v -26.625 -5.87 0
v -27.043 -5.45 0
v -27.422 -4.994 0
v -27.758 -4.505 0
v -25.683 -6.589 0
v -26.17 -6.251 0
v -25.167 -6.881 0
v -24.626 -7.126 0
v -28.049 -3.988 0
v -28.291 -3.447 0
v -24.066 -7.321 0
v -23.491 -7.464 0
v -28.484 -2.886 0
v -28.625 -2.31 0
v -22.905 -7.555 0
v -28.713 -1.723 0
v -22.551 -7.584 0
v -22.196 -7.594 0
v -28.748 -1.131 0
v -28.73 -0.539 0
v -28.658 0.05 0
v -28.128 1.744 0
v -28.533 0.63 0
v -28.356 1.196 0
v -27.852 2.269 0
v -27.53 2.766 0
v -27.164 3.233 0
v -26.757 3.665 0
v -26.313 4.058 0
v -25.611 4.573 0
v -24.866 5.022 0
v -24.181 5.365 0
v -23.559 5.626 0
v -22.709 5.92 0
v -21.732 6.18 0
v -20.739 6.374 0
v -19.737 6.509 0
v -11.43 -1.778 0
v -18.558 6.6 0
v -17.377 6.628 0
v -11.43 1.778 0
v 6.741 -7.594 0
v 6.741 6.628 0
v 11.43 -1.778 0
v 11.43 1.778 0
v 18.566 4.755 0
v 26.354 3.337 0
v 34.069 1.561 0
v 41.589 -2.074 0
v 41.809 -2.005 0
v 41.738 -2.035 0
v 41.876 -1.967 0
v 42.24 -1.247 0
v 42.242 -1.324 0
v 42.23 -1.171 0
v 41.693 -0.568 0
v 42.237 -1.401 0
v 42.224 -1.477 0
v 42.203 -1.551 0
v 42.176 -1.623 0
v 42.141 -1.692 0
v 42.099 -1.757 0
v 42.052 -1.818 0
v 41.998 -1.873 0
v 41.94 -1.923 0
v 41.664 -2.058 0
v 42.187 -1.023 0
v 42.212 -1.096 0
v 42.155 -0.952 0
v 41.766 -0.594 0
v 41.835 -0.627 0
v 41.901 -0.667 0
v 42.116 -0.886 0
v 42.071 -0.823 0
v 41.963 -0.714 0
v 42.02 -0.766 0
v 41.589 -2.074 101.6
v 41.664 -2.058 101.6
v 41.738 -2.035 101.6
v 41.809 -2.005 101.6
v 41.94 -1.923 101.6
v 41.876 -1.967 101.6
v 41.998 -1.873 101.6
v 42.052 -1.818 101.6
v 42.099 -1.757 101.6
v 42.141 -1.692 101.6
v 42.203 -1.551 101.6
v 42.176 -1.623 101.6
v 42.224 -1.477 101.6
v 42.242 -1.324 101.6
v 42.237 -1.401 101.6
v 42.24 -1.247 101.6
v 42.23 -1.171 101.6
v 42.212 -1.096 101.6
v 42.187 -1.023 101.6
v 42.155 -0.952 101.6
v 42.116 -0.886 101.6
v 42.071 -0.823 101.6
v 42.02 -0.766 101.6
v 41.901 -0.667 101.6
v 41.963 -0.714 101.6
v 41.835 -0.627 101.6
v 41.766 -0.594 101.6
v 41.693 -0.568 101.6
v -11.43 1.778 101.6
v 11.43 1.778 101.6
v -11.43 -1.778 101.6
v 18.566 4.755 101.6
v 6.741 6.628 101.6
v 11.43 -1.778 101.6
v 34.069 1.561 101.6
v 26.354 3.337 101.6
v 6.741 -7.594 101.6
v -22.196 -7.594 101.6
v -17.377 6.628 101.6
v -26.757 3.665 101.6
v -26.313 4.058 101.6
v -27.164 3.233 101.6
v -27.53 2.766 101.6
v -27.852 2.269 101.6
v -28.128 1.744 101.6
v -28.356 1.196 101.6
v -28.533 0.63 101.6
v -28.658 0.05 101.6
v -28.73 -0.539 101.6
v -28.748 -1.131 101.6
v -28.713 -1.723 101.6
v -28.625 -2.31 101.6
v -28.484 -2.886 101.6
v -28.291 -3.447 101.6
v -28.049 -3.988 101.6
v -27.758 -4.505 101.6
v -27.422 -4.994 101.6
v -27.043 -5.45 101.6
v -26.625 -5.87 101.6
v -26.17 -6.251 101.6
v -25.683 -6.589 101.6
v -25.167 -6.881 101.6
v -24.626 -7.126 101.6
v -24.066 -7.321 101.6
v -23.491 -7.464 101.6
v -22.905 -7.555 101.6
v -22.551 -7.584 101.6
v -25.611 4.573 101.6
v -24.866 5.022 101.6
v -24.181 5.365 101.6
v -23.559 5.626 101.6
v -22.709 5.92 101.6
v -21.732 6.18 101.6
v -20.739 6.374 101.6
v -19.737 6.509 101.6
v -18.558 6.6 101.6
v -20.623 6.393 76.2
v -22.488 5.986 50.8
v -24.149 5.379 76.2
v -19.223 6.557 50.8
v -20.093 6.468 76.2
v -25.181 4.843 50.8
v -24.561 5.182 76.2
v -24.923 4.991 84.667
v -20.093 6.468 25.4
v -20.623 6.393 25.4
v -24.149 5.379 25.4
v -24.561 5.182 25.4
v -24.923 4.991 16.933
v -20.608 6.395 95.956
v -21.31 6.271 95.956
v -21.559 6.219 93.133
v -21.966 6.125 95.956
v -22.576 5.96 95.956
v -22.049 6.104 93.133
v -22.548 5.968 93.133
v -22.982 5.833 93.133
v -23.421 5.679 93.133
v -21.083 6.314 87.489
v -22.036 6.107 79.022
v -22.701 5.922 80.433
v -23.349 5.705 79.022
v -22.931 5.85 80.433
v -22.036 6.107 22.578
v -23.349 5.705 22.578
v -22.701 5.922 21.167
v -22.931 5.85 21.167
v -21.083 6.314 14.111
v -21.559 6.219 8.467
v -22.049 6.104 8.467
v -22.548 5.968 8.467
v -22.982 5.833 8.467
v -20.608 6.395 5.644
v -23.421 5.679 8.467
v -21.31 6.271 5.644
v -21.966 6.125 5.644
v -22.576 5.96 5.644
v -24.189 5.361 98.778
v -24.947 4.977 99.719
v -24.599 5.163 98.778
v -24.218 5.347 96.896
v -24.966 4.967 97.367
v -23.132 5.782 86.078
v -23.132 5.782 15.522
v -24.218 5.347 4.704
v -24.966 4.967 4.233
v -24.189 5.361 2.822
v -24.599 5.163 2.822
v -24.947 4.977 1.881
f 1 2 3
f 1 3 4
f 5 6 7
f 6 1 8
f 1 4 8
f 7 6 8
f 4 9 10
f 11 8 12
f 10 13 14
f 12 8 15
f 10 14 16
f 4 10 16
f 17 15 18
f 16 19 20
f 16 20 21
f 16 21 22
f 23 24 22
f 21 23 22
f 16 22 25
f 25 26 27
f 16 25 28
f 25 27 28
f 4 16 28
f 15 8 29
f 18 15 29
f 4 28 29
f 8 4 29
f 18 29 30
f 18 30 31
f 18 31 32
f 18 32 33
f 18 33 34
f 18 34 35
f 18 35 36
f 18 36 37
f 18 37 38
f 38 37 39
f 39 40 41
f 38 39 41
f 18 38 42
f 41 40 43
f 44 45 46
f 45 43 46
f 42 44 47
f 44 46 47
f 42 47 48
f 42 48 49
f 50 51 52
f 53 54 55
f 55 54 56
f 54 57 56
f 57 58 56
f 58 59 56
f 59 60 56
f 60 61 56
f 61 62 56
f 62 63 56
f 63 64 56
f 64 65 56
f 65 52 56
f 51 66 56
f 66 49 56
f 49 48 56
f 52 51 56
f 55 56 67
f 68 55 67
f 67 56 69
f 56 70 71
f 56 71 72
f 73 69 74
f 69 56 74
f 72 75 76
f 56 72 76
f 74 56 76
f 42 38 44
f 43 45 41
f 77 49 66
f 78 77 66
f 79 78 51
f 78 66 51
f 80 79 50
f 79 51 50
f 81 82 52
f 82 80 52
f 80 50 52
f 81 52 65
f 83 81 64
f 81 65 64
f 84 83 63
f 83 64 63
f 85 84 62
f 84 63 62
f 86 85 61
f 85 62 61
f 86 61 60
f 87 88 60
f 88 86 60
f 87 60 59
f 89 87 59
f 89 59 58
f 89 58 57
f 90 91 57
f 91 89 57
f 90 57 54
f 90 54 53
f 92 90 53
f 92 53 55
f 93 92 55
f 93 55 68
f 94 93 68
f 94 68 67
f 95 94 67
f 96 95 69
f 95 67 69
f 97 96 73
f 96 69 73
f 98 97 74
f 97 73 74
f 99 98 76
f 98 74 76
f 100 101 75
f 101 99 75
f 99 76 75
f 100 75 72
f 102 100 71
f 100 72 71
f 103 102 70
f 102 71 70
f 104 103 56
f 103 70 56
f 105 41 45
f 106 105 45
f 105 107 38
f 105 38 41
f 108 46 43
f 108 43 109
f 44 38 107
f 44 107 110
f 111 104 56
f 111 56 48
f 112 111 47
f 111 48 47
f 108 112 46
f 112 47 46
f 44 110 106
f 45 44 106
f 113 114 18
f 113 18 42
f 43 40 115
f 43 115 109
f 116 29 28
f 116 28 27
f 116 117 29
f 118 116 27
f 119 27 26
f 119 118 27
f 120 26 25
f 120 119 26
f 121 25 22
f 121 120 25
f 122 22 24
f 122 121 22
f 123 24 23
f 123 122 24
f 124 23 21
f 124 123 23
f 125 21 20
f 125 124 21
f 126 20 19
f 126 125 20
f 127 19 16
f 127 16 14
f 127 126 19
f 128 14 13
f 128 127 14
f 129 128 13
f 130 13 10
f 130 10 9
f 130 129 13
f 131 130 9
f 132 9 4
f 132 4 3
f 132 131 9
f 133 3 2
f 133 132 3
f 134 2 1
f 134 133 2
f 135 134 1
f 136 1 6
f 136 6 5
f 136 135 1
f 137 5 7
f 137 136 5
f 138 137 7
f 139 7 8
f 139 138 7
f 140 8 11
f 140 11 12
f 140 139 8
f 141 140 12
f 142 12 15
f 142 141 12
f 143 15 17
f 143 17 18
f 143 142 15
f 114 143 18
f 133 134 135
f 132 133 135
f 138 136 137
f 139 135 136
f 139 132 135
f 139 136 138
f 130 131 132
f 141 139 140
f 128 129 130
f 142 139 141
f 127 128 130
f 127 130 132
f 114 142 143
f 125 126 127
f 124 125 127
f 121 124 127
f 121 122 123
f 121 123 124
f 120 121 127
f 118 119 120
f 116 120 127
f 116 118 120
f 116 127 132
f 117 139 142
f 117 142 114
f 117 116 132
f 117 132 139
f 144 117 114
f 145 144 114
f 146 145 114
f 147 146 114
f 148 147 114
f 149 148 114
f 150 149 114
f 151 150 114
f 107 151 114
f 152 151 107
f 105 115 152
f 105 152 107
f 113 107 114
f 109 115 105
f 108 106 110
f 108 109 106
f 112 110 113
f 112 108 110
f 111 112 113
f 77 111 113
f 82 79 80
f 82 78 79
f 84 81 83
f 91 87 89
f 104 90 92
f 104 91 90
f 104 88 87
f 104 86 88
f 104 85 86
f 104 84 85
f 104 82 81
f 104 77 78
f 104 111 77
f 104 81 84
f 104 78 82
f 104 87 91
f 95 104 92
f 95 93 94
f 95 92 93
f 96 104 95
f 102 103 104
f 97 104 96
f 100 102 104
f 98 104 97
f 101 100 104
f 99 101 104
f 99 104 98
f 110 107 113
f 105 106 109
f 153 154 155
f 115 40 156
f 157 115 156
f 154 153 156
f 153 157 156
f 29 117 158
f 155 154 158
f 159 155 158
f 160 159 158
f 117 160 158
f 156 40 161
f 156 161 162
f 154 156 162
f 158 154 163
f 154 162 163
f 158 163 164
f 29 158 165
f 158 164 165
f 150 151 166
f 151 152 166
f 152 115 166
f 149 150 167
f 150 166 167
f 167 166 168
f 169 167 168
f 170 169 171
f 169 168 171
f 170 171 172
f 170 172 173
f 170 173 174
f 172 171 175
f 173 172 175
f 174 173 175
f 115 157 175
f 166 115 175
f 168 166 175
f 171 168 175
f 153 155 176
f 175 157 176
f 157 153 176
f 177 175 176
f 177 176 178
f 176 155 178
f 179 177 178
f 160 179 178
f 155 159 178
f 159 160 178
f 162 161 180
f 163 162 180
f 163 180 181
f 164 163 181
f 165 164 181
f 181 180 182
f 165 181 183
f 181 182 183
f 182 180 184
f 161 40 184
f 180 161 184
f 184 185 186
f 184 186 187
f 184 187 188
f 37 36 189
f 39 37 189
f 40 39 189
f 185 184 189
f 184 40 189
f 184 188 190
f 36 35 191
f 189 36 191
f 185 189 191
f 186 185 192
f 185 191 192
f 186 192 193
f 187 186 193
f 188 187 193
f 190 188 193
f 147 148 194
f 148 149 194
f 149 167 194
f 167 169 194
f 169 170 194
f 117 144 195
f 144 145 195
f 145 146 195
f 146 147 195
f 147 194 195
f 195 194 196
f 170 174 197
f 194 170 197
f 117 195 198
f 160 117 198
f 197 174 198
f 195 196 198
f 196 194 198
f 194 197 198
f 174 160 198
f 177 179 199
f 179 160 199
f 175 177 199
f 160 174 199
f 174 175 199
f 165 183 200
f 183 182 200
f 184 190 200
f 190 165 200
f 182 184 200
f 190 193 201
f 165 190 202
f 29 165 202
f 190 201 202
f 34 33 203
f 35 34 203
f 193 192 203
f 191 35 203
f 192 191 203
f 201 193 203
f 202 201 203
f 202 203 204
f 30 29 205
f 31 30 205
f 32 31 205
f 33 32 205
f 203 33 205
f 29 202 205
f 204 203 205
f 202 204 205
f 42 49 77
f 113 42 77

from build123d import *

# Parameters (mm, degrees)
F0_W        = 75.0949196517
F0_H        = 14.2217068933
F0_W_2      = 22.86
F0_H_2      = 3.556
F1_DEPTH    = 101.6
F2_T1_DEPTH = 165.9870757085
F3_R        = 6.5531023684
F4_SIZE2    = 6.0344471764
F4_SIZE     = 38.1
F4_2_SIZE2  = 6.0344471764
F4_2_SIZE   = 38.1
F5_T1_DEPTH = 234.6078157438
F6_T1_DEPTH = 118.09821105


# Not quite as in the source:
# - a fillet or chamfer that OpenCascade refuses, or shapes differently, is made with other operations: its cross-section is extruded or revolved along the edge and cut away or added


with BuildPart() as f1:
    # F0 (on Top) → F1 (new body)
    with BuildSketch(Plane.XY):
        with Locations((7.2930697352, -0.4826590884)):
            Rectangle(F0_W, F0_H)
        Rectangle(F0_W_2, F0_H_2, mode=Mode.SUBTRACT)
    extrude(amount=F1_DEPTH)

    # F2: fillet of radius 12.8774151417 on 1 edges, made by hand

    # F2_s2 → F2_t1 (cut)
    with BuildSketch(Plane.XY.offset(-32.1935378542)):
        with BuildLine():
            add(Edge.make_bspline(
                [(-17.376974949, 6.6281943582), (-30.2543900907, 6.6281943582), (-30.2543900907, -6.2492207835)],
                knots=[0, 0, 0, 1, 1, 1], degree=2, weights=[1, 1, 1]))
            Line((-30.2543900907, -6.2492207835), (-30.2543900907, 6.6281943582))
            Line((-30.2543900907, 6.6281943582), (-17.376974949, 6.6281943582))
        make_face()
    extrude(amount=F2_T1_DEPTH, mode=Mode.SUBTRACT)

    # F3
    f3_edges = [f1.edges().sort_by_distance(p)[0] for p in [
        (-30.25439, -7.593513, 50.8),
    ]]
    fillet(f3_edges, radius=F3_R)

    # F4
    f4_edges = [f1.edges().sort_by_distance(p)[0] for p in [
        (44.84053, 6.628194, 50.8),
    ]]
    f4_side = f1.faces().sort_by_distance((13.731777, 6.628194, 50.8))[0]
    chamfer(f4_edges, length=F4_SIZE, length2=F4_SIZE2, reference=f4_side)

    # F4#2
    f4_2_edges = [f1.edges().sort_by_distance(p)[0] for p in [
        (44.84053, -7.593513, 50.8),
    ]]
    f4_2_side = f1.faces().sort_by_distance((11.322316, -7.593513, 50.8))[0]
    chamfer(f4_2_edges, length=F4_2_SIZE, length2=F4_2_SIZE2, reference=f4_2_side)

    # F5: fillet of radius 171.7049577379 on 1 edges, made by hand

    # F5_s2 → F5_t1 (cut)
    with BuildSketch(Plane.XY.offset(-66.5039078719)):
        with BuildLine():
            ThreePointArc((44.840529561, -1.5590653587), (31.8279082353, 2.1157050987), (18.5664757974, 4.7551484822))
            Line((18.5664757974, 4.7551484822), (44.840529561, 0.5937471818))
            Line((44.840529561, 0.5937471818), (44.840529561, -1.5590653587))
        make_face()
    extrude(amount=F5_T1_DEPTH, mode=Mode.SUBTRACT)

    # F6: fillet of radius 0.7744916247 on 1 edges, made by hand

    # F6_s2 → F6_t1 (cut)
    with BuildSketch(Plane.XY.offset(-8.249105525)):
        with BuildLine():
            ThreePointArc((41.5888697855, -2.0740776724), (42.240352702, -1.3626428472), (41.6931850181, -0.5681763427))
            ThreePointArc((41.6931850181, -0.5681763427), (43.2692375752, -1.0560603886), (44.840529561, -1.5590653587))
            Line((44.840529561, -1.5590653587), (41.5888697855, -2.0740776724))
        make_face()
    extrude(amount=F6_T1_DEPTH, mode=Mode.SUBTRACT)


solid = f1.part
